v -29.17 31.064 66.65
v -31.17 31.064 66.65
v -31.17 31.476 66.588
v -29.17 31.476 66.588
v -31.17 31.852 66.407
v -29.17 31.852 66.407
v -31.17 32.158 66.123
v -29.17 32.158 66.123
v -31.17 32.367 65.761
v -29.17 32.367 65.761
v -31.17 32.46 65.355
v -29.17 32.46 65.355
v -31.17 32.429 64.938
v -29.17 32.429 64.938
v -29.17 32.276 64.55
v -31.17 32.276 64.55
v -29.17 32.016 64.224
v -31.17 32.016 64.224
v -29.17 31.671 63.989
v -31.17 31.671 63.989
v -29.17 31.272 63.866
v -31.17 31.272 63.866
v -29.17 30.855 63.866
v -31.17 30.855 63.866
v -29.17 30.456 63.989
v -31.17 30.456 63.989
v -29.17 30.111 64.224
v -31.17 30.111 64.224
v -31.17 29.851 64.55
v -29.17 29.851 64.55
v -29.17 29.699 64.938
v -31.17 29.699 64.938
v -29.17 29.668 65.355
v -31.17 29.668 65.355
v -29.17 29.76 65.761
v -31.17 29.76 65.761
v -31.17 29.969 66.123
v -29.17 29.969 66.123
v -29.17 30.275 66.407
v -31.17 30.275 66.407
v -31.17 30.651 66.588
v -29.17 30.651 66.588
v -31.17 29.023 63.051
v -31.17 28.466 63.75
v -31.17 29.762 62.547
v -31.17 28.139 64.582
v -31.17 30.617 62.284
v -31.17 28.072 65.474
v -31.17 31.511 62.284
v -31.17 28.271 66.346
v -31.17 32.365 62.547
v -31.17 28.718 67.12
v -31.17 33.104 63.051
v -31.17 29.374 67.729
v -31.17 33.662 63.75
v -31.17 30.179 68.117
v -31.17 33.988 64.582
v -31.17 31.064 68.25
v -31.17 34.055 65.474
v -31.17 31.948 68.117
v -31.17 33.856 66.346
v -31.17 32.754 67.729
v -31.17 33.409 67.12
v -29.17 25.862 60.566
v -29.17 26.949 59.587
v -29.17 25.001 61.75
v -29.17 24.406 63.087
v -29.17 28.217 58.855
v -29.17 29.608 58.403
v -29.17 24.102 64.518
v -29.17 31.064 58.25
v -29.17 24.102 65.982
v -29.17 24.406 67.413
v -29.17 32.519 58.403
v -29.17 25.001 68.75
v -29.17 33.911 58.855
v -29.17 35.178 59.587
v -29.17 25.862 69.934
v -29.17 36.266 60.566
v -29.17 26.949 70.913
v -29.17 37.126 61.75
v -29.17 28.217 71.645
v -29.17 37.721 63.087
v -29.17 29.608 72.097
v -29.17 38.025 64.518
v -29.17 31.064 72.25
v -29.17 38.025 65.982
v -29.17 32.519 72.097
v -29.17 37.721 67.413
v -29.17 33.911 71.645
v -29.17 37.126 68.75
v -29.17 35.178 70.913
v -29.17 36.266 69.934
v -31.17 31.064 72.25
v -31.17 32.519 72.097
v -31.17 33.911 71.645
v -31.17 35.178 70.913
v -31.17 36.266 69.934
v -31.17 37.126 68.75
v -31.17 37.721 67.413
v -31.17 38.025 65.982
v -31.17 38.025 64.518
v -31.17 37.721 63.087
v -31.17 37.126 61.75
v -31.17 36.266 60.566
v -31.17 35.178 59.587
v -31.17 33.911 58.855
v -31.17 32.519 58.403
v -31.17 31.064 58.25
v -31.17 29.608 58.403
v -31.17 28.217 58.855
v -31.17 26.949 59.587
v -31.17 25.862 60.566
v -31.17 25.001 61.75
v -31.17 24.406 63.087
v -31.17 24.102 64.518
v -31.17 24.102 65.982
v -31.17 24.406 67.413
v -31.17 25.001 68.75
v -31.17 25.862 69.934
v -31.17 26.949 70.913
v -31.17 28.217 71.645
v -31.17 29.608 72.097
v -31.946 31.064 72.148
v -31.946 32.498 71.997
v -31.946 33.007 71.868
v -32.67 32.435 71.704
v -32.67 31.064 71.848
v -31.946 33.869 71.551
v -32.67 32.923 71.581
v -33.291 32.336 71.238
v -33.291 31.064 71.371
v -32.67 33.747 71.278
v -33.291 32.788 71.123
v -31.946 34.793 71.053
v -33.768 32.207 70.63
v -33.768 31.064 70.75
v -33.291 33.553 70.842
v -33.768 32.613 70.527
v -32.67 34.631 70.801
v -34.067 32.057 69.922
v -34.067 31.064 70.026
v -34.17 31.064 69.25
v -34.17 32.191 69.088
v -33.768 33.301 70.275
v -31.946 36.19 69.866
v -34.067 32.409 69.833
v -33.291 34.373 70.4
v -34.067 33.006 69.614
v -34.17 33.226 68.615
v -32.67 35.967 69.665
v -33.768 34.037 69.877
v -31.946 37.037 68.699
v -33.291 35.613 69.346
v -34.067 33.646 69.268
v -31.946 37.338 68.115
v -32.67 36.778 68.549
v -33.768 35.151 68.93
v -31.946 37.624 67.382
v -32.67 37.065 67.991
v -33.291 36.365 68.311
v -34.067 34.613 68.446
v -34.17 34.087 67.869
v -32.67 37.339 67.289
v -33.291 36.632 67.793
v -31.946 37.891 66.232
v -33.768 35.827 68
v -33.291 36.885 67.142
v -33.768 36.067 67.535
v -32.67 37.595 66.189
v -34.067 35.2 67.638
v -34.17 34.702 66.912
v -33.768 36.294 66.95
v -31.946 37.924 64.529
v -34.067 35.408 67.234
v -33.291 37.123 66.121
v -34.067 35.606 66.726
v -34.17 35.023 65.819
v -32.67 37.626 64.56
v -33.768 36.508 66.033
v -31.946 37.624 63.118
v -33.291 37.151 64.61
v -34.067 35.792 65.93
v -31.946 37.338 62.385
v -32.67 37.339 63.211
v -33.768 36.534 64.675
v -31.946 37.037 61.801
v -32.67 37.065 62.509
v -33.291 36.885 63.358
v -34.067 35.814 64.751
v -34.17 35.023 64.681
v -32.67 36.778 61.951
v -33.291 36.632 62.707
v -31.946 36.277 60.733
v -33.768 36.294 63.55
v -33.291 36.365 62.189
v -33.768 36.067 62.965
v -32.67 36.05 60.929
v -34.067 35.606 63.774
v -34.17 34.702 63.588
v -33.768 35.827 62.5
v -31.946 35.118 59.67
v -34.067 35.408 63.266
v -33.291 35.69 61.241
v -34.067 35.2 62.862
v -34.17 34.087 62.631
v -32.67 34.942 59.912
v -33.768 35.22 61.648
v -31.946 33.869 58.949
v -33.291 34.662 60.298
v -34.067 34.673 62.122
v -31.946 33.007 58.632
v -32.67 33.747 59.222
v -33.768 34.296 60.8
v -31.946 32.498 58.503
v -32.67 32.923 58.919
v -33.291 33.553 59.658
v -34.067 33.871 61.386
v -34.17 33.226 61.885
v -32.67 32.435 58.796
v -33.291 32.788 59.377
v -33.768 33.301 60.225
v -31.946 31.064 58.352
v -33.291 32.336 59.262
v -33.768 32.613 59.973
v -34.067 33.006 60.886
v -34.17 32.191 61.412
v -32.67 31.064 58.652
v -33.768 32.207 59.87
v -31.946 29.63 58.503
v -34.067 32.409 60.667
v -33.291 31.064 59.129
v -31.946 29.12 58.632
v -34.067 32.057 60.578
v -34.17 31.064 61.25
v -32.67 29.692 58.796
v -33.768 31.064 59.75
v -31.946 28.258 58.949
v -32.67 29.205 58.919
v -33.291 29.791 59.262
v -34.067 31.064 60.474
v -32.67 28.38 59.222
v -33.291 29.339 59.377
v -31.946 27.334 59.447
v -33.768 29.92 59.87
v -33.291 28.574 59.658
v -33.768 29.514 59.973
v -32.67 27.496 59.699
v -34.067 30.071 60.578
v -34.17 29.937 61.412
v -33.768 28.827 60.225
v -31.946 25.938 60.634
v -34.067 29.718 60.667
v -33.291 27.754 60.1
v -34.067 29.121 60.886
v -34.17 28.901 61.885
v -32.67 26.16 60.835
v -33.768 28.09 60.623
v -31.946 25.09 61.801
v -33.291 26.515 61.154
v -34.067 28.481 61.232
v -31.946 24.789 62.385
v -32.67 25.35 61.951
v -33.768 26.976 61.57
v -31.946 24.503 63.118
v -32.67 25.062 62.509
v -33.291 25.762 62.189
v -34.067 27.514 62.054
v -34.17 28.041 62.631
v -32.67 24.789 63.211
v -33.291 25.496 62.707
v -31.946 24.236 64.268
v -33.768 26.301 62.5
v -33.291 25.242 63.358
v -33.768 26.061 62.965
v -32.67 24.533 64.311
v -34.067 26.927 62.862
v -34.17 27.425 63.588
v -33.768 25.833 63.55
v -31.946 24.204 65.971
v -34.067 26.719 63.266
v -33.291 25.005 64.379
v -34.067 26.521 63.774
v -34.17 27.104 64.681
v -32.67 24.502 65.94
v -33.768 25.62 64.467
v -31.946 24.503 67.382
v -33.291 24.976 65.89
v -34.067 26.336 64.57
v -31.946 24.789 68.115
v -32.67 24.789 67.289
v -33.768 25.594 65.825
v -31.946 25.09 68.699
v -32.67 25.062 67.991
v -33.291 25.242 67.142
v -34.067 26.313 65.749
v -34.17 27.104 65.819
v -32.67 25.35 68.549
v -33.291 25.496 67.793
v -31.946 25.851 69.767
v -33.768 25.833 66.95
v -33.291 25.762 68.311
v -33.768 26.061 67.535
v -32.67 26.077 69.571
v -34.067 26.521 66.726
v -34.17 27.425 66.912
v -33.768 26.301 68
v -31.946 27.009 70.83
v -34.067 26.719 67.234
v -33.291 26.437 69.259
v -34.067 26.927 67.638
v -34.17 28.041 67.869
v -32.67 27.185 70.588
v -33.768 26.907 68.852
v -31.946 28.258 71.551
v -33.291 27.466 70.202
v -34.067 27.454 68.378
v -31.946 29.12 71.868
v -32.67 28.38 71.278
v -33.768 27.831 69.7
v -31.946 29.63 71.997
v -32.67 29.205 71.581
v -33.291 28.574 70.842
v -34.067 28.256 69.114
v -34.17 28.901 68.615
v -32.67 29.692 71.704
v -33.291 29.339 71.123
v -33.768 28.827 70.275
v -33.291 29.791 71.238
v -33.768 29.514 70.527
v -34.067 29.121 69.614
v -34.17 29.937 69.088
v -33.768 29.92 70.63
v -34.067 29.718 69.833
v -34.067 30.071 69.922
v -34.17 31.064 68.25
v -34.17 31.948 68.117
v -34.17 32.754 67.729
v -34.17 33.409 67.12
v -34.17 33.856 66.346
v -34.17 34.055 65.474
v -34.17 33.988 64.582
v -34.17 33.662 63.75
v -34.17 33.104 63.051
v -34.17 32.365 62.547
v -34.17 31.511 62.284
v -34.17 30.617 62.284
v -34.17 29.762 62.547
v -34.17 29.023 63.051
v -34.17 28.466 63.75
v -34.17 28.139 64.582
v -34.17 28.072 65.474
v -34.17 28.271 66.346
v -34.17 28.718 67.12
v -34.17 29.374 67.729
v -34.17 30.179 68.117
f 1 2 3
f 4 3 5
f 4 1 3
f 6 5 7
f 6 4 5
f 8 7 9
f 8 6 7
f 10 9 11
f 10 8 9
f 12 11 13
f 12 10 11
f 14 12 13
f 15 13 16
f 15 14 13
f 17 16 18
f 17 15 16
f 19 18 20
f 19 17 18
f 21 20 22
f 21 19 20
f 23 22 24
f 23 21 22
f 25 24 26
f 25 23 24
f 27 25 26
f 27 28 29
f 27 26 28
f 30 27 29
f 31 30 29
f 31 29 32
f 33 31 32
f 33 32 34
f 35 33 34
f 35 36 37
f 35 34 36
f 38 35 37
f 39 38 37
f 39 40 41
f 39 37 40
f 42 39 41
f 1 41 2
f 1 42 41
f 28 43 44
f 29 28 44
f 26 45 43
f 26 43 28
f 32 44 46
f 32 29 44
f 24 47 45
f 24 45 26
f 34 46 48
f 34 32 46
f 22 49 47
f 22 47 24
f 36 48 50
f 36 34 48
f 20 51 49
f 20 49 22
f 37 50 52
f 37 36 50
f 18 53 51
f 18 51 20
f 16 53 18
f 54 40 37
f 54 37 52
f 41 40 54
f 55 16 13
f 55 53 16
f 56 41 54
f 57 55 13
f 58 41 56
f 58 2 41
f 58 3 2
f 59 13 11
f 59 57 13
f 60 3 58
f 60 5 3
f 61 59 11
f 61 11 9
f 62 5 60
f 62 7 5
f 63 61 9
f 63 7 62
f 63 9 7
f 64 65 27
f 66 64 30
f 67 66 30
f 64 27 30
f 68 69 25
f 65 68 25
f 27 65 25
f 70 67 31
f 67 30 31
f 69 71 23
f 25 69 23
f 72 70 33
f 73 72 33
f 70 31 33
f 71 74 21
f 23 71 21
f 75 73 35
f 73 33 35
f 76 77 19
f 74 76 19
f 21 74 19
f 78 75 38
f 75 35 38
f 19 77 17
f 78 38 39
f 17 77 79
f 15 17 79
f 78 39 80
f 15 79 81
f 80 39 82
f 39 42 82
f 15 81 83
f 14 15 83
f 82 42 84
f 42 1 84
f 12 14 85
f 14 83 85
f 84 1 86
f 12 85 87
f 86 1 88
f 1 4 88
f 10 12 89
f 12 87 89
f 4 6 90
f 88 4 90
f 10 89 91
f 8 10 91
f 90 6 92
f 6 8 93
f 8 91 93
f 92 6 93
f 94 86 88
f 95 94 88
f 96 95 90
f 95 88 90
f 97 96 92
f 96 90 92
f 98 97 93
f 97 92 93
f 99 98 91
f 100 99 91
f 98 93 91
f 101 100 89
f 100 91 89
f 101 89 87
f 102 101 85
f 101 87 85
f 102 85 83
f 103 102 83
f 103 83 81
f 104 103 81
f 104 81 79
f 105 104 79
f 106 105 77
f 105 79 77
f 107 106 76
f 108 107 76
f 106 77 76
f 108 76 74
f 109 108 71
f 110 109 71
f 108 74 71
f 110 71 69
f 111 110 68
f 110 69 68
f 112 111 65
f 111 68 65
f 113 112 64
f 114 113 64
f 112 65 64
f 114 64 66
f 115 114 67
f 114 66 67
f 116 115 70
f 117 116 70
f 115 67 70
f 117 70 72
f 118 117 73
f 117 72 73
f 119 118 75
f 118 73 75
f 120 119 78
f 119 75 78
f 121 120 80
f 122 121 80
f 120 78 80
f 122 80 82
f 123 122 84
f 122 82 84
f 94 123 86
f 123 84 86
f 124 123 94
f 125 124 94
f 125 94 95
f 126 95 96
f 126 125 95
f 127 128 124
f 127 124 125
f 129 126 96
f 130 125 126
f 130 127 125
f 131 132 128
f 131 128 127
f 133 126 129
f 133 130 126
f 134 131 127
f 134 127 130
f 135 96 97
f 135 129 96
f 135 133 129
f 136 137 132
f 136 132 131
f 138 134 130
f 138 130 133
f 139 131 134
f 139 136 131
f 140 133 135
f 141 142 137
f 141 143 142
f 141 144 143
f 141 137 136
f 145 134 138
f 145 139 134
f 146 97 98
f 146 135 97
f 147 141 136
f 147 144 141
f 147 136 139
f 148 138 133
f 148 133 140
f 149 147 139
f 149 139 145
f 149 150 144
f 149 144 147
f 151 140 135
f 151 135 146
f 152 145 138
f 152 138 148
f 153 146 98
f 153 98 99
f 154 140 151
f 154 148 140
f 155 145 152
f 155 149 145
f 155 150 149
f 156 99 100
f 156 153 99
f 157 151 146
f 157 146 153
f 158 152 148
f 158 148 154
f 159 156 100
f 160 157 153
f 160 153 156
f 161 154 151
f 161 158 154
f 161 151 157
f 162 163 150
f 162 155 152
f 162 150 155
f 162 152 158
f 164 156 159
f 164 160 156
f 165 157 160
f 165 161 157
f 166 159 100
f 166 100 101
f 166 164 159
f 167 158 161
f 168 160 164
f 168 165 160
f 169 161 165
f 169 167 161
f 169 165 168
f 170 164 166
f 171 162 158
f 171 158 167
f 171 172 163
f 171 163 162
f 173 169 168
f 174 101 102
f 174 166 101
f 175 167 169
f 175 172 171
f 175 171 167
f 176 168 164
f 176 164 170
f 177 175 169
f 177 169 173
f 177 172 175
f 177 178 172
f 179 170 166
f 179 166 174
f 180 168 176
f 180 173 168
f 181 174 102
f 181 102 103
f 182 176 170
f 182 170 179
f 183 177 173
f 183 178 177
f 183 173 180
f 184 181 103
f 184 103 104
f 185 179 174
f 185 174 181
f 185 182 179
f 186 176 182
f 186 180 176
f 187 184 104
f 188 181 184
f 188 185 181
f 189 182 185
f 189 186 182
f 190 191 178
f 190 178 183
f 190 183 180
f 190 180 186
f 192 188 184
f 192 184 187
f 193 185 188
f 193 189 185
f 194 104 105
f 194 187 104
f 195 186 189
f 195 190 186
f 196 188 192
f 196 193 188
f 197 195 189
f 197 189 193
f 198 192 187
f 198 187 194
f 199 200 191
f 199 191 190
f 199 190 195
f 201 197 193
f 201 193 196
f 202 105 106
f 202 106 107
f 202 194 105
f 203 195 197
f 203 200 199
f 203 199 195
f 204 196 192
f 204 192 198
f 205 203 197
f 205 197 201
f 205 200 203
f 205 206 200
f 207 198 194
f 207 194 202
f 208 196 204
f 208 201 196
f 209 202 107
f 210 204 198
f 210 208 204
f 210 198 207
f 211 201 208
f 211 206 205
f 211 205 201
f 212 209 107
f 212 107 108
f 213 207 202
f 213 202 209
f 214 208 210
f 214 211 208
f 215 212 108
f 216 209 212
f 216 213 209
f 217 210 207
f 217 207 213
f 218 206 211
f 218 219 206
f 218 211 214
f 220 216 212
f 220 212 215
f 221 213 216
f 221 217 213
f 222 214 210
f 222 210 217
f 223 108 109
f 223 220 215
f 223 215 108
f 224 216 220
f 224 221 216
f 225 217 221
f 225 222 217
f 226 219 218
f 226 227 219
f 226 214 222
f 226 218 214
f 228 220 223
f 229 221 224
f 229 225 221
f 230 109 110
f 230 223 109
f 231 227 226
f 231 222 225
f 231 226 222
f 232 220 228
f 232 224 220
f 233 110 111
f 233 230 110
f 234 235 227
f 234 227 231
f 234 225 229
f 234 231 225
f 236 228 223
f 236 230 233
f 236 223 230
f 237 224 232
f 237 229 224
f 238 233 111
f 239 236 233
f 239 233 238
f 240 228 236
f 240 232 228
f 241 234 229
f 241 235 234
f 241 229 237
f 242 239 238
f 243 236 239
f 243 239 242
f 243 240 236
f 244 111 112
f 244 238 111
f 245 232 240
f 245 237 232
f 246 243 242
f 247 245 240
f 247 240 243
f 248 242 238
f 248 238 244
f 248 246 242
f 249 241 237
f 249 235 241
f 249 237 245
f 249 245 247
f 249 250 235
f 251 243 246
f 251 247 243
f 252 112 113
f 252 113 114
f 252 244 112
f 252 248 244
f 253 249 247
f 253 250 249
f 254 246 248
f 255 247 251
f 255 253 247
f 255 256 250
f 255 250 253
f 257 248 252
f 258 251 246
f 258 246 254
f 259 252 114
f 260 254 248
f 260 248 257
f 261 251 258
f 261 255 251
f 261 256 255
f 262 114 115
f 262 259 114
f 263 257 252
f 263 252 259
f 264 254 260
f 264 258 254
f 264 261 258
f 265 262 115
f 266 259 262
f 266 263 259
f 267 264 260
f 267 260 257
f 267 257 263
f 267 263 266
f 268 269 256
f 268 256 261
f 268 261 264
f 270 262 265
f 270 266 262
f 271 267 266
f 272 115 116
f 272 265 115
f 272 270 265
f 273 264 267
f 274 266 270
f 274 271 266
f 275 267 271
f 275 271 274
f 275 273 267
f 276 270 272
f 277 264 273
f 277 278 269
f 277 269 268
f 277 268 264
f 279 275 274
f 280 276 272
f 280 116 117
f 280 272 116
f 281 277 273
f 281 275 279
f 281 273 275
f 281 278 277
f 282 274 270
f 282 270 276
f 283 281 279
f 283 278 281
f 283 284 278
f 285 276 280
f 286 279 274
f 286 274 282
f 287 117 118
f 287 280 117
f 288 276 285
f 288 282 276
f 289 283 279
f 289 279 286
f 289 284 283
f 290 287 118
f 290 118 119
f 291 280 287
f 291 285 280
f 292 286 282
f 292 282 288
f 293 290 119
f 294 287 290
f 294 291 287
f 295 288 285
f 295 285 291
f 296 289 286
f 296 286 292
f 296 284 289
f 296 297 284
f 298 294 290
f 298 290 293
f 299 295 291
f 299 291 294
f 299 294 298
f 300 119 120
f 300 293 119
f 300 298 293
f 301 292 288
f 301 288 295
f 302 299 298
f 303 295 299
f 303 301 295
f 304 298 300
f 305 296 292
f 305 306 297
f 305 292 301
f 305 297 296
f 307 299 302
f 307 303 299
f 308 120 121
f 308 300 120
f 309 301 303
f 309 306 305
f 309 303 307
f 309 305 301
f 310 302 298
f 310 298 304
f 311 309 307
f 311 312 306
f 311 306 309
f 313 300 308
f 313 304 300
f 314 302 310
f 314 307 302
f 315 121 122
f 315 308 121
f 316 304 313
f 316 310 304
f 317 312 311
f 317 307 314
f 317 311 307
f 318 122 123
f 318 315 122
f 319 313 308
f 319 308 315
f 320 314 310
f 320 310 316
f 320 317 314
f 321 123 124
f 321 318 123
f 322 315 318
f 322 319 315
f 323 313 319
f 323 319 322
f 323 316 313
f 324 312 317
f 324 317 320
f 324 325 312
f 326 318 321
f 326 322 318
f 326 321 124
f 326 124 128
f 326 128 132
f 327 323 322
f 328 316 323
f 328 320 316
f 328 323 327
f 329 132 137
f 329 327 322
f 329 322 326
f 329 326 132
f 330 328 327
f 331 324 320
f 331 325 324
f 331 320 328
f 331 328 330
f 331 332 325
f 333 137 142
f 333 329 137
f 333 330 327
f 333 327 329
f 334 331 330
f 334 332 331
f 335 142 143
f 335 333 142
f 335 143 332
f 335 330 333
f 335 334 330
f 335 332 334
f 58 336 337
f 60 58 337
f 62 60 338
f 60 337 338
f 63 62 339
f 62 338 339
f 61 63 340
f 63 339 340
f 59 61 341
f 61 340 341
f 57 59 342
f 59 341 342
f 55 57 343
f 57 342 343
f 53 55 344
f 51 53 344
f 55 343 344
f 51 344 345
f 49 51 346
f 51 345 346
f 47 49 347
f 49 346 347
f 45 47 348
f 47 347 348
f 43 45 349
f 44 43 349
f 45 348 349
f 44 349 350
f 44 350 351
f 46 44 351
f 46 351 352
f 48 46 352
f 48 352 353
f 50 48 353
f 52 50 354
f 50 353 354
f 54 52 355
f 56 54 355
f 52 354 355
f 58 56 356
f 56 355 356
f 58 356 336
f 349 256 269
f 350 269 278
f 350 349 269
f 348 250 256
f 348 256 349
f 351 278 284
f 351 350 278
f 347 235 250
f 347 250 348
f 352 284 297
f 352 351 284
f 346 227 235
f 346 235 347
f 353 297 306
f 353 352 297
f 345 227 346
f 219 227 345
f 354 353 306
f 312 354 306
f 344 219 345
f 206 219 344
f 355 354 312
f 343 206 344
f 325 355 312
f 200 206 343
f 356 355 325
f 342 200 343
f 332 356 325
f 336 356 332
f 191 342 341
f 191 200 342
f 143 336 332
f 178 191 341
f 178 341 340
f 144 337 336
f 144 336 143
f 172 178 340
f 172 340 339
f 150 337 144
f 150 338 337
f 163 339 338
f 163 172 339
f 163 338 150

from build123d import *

# Parameters (mm, degrees)
CROQUIS6_R              = 7
CROQUIS6_R_2            = 1.4
SALIENTE_EXTRUIR4_DEPTH = 5
REDONDEO2_R             = 3
CROQUIS7_R              = 3
CORTAR_EXTRUIR2_DEPTH   = 3


with BuildPart() as part:
    # Croquis6 → Saliente-Extruir4 (new body)
    with BuildSketch(Plane.ZY.offset(29.169607513)):
        with Locations((65.25, 31.063666838)):
            Circle(CROQUIS6_R)
        with Locations((65.25, 31.063666838)):
            Circle(CROQUIS6_R_2, mode=Mode.SUBTRACT)
    extrude(amount=SALIENTE_EXTRUIR4_DEPTH)

    # Redondeo2
    redondeo2_edges = [part.edges().sort_by_distance(p)[0] for p in [
        (-34.169607513, 31.063666838, 58.25),
    ]]
    fillet(redondeo2_edges, radius=REDONDEO2_R)

    # Croquis7 → Cortar-Extruir2 (cut)
    with BuildSketch(Plane.ZY.offset(34.169607513)):
        with Locations((65.25, 31.063666838)):
            Circle(CROQUIS7_R)
    extrude(amount=-CORTAR_EXTRUIR2_DEPTH, mode=Mode.SUBTRACT)


solid = part.part
